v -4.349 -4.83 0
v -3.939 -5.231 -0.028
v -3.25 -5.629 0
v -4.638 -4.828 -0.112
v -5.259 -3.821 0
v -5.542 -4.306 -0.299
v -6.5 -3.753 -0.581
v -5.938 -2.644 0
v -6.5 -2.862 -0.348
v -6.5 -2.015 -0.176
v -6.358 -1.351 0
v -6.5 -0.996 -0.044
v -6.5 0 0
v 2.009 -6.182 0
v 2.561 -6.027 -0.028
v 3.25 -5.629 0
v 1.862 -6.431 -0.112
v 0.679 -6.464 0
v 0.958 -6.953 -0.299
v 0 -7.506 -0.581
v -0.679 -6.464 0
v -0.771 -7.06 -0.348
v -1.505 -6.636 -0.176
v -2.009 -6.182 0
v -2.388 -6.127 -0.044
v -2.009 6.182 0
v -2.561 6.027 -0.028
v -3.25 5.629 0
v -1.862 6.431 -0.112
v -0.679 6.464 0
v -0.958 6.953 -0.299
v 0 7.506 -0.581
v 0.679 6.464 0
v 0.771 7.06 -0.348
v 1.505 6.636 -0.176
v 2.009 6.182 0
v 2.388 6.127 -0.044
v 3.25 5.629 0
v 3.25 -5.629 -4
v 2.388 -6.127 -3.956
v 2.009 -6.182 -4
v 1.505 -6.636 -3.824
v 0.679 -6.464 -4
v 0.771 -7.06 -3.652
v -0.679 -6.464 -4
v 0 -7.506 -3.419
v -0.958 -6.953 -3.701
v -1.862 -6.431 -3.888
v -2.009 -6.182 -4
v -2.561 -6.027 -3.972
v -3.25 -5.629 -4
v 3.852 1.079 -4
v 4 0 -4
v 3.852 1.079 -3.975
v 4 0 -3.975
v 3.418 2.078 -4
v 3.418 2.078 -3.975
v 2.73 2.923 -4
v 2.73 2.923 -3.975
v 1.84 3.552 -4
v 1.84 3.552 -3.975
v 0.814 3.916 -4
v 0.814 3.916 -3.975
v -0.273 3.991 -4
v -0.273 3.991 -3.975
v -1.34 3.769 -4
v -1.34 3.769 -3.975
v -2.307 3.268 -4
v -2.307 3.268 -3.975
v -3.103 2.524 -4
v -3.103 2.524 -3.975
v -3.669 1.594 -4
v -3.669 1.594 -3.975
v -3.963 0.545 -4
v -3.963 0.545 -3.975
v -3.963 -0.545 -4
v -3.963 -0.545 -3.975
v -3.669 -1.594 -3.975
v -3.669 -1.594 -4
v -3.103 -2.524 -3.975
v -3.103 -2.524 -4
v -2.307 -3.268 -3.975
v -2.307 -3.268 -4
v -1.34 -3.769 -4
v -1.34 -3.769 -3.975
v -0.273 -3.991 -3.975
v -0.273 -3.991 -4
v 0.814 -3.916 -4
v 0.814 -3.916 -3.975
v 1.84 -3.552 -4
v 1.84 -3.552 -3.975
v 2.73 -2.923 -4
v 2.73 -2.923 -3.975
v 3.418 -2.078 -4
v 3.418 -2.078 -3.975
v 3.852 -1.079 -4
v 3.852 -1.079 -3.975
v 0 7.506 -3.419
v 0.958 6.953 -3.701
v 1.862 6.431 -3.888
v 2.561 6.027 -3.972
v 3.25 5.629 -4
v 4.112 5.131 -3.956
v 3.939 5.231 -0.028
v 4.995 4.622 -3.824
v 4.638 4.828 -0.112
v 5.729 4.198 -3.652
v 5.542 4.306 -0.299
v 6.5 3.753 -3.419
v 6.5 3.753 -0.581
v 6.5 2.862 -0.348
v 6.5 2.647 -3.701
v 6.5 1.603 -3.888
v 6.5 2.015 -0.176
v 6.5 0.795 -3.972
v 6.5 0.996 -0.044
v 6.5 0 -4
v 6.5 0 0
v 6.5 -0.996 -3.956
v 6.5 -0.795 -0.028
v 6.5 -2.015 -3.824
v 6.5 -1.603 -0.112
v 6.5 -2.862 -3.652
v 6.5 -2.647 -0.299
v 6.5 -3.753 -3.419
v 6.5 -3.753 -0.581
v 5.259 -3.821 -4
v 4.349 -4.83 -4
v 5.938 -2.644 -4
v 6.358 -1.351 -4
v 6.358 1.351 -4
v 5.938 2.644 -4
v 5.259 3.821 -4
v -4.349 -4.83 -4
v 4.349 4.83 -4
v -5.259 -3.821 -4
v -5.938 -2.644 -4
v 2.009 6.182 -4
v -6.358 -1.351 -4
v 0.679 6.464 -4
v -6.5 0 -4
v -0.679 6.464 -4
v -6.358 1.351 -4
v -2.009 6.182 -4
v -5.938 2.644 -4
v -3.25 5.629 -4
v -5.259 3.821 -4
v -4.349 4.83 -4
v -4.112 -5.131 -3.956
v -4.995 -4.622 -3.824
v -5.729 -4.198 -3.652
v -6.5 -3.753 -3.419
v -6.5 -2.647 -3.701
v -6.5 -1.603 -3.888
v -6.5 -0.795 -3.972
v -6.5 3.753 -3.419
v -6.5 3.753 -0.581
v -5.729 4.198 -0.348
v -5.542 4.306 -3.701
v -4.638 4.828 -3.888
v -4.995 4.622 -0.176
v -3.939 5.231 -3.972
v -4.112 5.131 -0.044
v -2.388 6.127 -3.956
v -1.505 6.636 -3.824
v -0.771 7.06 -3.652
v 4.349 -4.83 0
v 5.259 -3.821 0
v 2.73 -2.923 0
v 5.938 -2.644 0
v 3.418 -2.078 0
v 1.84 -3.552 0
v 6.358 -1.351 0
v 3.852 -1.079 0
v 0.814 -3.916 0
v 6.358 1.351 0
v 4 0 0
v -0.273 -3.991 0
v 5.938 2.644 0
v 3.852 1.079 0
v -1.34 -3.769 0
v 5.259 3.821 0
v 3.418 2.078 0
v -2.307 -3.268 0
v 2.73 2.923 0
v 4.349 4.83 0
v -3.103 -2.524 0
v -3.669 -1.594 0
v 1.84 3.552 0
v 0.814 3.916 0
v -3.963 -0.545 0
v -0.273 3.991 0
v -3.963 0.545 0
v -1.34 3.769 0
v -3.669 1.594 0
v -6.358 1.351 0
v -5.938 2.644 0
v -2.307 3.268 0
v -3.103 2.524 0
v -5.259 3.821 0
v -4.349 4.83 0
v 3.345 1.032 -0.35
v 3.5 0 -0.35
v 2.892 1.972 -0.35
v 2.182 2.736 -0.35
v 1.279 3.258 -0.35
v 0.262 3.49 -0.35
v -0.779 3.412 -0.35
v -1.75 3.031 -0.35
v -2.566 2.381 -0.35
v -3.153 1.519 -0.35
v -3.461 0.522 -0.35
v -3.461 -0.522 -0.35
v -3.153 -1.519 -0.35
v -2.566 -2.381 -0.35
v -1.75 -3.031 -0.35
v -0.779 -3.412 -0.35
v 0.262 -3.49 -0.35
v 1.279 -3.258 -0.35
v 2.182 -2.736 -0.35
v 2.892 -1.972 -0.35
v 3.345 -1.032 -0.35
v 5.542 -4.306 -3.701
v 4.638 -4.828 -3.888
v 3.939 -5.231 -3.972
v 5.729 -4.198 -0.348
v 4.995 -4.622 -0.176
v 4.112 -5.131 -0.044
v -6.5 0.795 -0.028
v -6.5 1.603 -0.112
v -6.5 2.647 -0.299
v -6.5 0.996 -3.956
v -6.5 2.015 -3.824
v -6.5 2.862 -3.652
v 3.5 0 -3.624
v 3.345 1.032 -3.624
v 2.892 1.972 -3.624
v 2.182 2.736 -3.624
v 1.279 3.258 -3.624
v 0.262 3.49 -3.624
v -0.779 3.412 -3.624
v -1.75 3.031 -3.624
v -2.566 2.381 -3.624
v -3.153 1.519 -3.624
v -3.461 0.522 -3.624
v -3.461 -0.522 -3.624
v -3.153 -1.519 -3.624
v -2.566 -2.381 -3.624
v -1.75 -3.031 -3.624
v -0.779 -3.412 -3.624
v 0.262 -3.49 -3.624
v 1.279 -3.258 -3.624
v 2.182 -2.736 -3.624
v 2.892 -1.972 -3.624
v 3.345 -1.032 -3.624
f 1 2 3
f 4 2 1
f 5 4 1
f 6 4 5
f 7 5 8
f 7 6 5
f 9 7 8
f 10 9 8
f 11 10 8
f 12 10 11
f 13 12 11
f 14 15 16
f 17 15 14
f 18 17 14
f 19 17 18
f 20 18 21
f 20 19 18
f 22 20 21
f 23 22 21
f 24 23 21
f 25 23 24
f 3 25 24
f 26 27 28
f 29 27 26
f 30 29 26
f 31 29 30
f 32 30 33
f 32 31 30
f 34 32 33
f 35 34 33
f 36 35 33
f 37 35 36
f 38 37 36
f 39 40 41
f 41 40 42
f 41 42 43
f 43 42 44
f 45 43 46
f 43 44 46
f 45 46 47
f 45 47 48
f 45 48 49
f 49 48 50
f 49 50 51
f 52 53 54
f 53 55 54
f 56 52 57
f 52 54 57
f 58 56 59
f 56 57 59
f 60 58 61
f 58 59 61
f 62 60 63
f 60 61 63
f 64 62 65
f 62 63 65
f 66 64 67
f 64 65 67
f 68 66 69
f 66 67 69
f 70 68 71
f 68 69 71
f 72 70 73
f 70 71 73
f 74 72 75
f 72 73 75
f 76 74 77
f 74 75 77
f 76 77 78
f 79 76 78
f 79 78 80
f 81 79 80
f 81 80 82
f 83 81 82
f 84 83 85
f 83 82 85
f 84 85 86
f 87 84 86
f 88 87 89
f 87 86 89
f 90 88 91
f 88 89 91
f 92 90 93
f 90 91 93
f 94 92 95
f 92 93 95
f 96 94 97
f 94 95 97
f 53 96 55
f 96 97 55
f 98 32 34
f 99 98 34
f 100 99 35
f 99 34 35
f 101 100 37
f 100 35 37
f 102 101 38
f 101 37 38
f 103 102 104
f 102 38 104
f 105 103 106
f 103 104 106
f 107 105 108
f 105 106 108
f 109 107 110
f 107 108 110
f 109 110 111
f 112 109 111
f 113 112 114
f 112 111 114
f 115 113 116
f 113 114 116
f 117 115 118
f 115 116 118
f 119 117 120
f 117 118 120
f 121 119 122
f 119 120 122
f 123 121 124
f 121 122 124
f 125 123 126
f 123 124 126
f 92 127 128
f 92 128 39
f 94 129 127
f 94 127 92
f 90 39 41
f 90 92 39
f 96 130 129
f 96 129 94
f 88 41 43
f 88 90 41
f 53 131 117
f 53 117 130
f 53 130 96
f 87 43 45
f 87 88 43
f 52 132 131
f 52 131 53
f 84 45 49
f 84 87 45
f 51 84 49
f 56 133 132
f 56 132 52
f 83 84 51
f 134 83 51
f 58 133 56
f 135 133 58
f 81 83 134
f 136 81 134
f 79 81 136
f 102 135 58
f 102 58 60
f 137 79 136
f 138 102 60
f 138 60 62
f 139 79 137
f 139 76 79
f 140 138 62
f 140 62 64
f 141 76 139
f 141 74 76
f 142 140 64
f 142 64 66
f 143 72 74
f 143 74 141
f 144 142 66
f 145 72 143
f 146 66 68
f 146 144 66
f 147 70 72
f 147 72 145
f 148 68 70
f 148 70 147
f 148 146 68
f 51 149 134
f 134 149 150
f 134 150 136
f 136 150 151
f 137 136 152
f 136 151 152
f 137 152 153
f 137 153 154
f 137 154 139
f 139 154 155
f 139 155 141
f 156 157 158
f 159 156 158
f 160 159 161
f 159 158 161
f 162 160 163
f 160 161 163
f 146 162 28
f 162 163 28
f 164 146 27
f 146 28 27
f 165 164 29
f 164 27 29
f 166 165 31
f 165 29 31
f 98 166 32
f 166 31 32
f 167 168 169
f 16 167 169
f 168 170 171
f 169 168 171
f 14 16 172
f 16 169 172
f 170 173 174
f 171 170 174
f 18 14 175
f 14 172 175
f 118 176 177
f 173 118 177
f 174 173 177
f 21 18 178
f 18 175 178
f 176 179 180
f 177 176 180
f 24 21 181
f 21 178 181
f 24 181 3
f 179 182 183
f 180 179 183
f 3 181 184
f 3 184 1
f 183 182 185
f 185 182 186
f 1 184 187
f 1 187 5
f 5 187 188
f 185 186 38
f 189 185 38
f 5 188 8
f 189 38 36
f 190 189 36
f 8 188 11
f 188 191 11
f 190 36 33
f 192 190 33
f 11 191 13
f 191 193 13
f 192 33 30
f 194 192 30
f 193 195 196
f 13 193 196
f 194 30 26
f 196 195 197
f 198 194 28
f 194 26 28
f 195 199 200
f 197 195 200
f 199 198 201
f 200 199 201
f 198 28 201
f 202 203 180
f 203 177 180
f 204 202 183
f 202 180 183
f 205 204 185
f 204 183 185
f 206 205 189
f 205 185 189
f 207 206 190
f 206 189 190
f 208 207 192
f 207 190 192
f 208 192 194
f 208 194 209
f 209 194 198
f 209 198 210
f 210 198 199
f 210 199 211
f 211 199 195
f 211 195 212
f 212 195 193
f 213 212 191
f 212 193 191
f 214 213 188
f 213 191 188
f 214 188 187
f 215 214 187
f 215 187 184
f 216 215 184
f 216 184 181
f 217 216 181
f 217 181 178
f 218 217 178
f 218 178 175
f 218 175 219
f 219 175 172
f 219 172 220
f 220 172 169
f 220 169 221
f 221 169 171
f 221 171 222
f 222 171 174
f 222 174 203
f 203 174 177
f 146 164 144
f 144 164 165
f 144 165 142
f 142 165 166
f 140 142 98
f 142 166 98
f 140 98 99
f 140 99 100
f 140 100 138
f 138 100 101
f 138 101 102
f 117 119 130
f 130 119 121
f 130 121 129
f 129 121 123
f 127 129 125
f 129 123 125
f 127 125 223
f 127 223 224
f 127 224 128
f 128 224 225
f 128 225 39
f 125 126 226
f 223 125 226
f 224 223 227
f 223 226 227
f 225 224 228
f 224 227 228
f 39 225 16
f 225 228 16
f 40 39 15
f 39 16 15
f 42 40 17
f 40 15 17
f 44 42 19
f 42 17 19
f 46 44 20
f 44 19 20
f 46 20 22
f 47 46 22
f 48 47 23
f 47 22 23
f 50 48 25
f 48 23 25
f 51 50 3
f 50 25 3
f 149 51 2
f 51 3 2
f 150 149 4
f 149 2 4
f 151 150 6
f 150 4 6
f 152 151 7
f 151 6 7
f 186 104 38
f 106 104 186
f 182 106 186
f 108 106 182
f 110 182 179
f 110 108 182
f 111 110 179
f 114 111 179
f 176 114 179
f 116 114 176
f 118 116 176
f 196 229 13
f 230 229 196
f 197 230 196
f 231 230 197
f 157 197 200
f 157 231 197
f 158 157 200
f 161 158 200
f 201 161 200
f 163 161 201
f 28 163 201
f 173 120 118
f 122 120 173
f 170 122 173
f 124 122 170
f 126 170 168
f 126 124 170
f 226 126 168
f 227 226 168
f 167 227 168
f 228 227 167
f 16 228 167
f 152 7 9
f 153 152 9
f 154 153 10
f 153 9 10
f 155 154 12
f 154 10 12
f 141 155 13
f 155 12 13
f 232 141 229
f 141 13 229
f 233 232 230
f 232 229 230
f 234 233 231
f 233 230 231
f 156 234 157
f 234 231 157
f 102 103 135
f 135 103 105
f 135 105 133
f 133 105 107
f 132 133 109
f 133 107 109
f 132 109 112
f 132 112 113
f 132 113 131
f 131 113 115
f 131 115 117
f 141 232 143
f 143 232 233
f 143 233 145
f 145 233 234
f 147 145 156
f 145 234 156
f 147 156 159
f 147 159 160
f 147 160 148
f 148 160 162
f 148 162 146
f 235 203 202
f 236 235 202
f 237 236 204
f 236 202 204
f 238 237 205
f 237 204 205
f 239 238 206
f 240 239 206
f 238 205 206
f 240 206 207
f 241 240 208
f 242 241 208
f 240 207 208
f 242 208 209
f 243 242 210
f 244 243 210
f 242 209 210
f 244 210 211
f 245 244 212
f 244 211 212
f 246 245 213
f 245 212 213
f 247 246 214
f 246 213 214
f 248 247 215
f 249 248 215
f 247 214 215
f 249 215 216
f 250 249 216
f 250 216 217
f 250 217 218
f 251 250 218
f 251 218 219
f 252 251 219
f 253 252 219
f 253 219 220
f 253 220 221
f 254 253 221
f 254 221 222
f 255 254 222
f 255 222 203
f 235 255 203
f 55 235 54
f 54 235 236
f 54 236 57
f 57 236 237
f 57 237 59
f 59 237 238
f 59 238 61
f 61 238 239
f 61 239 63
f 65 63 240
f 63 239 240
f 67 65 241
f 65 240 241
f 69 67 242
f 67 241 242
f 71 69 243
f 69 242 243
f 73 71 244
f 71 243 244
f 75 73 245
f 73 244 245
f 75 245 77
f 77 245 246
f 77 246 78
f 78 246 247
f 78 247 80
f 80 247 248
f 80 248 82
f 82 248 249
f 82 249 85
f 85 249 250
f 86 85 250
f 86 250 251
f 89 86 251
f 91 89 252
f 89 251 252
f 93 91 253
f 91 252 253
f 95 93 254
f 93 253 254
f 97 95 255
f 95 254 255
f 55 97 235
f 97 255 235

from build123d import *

# Parameters (mm, degrees)
BASENUTSKE_R  = 3.5
BASENUT_DEPTH = 4


# Read off the part's stored shape, not the designer's step: ThreadSchematic
with BuildPart() as part:
    # BaseNutSke → BaseNut (new body)
    with BuildSketch(Plane.XY):
        Polygon((6.5, 3.75277675), (6.5, -3.75277675), (0, -7.505553499), (-6.5, -3.75277675), (-6.5, 3.75277675), (0, 7.505553499), align=None)
        Circle(BASENUTSKE_R, mode=Mode.SUBTRACT)
    extrude(amount=-BASENUT_DEPTH)

    # Sketch3 → Double-Chamfer (revolve, cut)
    with BuildSketch(Plane(origin=(0, 0, 0), x_dir=(0, 0, -1), z_dir=(1, 0, 0))):
        Polygon((4, 6.5), (3.419443416, 7.505553499), (3.419443416, 17.505553499), (14, 17.505553499), (14, 6.5), align=None)
        Polygon((0.580556584, 17.505553499), (-10, 17.505553499), (-10, 6.5), (0, 6.5), (0.580556584, 7.505553499), align=None)
    revolve(axis=Axis((0, 0, 0), (0, 0, -1)), mode=Mode.SUBTRACT)

    # ThreadSchematic outline → ThreadSchematic (revolve, cut)
    with BuildSketch(Plane.XZ):
        Polygon((3.5, 0), (3.5, -0.350103769), (4, 0), align=None)
        Polygon((4, -3.9746), (3.5, -3.624496231), (3.5, -4), (4, -4), align=None)
    revolve(axis=Axis((0, 0, 0), (0, 0, 1)), mode=Mode.SUBTRACT)


solid = part.part
